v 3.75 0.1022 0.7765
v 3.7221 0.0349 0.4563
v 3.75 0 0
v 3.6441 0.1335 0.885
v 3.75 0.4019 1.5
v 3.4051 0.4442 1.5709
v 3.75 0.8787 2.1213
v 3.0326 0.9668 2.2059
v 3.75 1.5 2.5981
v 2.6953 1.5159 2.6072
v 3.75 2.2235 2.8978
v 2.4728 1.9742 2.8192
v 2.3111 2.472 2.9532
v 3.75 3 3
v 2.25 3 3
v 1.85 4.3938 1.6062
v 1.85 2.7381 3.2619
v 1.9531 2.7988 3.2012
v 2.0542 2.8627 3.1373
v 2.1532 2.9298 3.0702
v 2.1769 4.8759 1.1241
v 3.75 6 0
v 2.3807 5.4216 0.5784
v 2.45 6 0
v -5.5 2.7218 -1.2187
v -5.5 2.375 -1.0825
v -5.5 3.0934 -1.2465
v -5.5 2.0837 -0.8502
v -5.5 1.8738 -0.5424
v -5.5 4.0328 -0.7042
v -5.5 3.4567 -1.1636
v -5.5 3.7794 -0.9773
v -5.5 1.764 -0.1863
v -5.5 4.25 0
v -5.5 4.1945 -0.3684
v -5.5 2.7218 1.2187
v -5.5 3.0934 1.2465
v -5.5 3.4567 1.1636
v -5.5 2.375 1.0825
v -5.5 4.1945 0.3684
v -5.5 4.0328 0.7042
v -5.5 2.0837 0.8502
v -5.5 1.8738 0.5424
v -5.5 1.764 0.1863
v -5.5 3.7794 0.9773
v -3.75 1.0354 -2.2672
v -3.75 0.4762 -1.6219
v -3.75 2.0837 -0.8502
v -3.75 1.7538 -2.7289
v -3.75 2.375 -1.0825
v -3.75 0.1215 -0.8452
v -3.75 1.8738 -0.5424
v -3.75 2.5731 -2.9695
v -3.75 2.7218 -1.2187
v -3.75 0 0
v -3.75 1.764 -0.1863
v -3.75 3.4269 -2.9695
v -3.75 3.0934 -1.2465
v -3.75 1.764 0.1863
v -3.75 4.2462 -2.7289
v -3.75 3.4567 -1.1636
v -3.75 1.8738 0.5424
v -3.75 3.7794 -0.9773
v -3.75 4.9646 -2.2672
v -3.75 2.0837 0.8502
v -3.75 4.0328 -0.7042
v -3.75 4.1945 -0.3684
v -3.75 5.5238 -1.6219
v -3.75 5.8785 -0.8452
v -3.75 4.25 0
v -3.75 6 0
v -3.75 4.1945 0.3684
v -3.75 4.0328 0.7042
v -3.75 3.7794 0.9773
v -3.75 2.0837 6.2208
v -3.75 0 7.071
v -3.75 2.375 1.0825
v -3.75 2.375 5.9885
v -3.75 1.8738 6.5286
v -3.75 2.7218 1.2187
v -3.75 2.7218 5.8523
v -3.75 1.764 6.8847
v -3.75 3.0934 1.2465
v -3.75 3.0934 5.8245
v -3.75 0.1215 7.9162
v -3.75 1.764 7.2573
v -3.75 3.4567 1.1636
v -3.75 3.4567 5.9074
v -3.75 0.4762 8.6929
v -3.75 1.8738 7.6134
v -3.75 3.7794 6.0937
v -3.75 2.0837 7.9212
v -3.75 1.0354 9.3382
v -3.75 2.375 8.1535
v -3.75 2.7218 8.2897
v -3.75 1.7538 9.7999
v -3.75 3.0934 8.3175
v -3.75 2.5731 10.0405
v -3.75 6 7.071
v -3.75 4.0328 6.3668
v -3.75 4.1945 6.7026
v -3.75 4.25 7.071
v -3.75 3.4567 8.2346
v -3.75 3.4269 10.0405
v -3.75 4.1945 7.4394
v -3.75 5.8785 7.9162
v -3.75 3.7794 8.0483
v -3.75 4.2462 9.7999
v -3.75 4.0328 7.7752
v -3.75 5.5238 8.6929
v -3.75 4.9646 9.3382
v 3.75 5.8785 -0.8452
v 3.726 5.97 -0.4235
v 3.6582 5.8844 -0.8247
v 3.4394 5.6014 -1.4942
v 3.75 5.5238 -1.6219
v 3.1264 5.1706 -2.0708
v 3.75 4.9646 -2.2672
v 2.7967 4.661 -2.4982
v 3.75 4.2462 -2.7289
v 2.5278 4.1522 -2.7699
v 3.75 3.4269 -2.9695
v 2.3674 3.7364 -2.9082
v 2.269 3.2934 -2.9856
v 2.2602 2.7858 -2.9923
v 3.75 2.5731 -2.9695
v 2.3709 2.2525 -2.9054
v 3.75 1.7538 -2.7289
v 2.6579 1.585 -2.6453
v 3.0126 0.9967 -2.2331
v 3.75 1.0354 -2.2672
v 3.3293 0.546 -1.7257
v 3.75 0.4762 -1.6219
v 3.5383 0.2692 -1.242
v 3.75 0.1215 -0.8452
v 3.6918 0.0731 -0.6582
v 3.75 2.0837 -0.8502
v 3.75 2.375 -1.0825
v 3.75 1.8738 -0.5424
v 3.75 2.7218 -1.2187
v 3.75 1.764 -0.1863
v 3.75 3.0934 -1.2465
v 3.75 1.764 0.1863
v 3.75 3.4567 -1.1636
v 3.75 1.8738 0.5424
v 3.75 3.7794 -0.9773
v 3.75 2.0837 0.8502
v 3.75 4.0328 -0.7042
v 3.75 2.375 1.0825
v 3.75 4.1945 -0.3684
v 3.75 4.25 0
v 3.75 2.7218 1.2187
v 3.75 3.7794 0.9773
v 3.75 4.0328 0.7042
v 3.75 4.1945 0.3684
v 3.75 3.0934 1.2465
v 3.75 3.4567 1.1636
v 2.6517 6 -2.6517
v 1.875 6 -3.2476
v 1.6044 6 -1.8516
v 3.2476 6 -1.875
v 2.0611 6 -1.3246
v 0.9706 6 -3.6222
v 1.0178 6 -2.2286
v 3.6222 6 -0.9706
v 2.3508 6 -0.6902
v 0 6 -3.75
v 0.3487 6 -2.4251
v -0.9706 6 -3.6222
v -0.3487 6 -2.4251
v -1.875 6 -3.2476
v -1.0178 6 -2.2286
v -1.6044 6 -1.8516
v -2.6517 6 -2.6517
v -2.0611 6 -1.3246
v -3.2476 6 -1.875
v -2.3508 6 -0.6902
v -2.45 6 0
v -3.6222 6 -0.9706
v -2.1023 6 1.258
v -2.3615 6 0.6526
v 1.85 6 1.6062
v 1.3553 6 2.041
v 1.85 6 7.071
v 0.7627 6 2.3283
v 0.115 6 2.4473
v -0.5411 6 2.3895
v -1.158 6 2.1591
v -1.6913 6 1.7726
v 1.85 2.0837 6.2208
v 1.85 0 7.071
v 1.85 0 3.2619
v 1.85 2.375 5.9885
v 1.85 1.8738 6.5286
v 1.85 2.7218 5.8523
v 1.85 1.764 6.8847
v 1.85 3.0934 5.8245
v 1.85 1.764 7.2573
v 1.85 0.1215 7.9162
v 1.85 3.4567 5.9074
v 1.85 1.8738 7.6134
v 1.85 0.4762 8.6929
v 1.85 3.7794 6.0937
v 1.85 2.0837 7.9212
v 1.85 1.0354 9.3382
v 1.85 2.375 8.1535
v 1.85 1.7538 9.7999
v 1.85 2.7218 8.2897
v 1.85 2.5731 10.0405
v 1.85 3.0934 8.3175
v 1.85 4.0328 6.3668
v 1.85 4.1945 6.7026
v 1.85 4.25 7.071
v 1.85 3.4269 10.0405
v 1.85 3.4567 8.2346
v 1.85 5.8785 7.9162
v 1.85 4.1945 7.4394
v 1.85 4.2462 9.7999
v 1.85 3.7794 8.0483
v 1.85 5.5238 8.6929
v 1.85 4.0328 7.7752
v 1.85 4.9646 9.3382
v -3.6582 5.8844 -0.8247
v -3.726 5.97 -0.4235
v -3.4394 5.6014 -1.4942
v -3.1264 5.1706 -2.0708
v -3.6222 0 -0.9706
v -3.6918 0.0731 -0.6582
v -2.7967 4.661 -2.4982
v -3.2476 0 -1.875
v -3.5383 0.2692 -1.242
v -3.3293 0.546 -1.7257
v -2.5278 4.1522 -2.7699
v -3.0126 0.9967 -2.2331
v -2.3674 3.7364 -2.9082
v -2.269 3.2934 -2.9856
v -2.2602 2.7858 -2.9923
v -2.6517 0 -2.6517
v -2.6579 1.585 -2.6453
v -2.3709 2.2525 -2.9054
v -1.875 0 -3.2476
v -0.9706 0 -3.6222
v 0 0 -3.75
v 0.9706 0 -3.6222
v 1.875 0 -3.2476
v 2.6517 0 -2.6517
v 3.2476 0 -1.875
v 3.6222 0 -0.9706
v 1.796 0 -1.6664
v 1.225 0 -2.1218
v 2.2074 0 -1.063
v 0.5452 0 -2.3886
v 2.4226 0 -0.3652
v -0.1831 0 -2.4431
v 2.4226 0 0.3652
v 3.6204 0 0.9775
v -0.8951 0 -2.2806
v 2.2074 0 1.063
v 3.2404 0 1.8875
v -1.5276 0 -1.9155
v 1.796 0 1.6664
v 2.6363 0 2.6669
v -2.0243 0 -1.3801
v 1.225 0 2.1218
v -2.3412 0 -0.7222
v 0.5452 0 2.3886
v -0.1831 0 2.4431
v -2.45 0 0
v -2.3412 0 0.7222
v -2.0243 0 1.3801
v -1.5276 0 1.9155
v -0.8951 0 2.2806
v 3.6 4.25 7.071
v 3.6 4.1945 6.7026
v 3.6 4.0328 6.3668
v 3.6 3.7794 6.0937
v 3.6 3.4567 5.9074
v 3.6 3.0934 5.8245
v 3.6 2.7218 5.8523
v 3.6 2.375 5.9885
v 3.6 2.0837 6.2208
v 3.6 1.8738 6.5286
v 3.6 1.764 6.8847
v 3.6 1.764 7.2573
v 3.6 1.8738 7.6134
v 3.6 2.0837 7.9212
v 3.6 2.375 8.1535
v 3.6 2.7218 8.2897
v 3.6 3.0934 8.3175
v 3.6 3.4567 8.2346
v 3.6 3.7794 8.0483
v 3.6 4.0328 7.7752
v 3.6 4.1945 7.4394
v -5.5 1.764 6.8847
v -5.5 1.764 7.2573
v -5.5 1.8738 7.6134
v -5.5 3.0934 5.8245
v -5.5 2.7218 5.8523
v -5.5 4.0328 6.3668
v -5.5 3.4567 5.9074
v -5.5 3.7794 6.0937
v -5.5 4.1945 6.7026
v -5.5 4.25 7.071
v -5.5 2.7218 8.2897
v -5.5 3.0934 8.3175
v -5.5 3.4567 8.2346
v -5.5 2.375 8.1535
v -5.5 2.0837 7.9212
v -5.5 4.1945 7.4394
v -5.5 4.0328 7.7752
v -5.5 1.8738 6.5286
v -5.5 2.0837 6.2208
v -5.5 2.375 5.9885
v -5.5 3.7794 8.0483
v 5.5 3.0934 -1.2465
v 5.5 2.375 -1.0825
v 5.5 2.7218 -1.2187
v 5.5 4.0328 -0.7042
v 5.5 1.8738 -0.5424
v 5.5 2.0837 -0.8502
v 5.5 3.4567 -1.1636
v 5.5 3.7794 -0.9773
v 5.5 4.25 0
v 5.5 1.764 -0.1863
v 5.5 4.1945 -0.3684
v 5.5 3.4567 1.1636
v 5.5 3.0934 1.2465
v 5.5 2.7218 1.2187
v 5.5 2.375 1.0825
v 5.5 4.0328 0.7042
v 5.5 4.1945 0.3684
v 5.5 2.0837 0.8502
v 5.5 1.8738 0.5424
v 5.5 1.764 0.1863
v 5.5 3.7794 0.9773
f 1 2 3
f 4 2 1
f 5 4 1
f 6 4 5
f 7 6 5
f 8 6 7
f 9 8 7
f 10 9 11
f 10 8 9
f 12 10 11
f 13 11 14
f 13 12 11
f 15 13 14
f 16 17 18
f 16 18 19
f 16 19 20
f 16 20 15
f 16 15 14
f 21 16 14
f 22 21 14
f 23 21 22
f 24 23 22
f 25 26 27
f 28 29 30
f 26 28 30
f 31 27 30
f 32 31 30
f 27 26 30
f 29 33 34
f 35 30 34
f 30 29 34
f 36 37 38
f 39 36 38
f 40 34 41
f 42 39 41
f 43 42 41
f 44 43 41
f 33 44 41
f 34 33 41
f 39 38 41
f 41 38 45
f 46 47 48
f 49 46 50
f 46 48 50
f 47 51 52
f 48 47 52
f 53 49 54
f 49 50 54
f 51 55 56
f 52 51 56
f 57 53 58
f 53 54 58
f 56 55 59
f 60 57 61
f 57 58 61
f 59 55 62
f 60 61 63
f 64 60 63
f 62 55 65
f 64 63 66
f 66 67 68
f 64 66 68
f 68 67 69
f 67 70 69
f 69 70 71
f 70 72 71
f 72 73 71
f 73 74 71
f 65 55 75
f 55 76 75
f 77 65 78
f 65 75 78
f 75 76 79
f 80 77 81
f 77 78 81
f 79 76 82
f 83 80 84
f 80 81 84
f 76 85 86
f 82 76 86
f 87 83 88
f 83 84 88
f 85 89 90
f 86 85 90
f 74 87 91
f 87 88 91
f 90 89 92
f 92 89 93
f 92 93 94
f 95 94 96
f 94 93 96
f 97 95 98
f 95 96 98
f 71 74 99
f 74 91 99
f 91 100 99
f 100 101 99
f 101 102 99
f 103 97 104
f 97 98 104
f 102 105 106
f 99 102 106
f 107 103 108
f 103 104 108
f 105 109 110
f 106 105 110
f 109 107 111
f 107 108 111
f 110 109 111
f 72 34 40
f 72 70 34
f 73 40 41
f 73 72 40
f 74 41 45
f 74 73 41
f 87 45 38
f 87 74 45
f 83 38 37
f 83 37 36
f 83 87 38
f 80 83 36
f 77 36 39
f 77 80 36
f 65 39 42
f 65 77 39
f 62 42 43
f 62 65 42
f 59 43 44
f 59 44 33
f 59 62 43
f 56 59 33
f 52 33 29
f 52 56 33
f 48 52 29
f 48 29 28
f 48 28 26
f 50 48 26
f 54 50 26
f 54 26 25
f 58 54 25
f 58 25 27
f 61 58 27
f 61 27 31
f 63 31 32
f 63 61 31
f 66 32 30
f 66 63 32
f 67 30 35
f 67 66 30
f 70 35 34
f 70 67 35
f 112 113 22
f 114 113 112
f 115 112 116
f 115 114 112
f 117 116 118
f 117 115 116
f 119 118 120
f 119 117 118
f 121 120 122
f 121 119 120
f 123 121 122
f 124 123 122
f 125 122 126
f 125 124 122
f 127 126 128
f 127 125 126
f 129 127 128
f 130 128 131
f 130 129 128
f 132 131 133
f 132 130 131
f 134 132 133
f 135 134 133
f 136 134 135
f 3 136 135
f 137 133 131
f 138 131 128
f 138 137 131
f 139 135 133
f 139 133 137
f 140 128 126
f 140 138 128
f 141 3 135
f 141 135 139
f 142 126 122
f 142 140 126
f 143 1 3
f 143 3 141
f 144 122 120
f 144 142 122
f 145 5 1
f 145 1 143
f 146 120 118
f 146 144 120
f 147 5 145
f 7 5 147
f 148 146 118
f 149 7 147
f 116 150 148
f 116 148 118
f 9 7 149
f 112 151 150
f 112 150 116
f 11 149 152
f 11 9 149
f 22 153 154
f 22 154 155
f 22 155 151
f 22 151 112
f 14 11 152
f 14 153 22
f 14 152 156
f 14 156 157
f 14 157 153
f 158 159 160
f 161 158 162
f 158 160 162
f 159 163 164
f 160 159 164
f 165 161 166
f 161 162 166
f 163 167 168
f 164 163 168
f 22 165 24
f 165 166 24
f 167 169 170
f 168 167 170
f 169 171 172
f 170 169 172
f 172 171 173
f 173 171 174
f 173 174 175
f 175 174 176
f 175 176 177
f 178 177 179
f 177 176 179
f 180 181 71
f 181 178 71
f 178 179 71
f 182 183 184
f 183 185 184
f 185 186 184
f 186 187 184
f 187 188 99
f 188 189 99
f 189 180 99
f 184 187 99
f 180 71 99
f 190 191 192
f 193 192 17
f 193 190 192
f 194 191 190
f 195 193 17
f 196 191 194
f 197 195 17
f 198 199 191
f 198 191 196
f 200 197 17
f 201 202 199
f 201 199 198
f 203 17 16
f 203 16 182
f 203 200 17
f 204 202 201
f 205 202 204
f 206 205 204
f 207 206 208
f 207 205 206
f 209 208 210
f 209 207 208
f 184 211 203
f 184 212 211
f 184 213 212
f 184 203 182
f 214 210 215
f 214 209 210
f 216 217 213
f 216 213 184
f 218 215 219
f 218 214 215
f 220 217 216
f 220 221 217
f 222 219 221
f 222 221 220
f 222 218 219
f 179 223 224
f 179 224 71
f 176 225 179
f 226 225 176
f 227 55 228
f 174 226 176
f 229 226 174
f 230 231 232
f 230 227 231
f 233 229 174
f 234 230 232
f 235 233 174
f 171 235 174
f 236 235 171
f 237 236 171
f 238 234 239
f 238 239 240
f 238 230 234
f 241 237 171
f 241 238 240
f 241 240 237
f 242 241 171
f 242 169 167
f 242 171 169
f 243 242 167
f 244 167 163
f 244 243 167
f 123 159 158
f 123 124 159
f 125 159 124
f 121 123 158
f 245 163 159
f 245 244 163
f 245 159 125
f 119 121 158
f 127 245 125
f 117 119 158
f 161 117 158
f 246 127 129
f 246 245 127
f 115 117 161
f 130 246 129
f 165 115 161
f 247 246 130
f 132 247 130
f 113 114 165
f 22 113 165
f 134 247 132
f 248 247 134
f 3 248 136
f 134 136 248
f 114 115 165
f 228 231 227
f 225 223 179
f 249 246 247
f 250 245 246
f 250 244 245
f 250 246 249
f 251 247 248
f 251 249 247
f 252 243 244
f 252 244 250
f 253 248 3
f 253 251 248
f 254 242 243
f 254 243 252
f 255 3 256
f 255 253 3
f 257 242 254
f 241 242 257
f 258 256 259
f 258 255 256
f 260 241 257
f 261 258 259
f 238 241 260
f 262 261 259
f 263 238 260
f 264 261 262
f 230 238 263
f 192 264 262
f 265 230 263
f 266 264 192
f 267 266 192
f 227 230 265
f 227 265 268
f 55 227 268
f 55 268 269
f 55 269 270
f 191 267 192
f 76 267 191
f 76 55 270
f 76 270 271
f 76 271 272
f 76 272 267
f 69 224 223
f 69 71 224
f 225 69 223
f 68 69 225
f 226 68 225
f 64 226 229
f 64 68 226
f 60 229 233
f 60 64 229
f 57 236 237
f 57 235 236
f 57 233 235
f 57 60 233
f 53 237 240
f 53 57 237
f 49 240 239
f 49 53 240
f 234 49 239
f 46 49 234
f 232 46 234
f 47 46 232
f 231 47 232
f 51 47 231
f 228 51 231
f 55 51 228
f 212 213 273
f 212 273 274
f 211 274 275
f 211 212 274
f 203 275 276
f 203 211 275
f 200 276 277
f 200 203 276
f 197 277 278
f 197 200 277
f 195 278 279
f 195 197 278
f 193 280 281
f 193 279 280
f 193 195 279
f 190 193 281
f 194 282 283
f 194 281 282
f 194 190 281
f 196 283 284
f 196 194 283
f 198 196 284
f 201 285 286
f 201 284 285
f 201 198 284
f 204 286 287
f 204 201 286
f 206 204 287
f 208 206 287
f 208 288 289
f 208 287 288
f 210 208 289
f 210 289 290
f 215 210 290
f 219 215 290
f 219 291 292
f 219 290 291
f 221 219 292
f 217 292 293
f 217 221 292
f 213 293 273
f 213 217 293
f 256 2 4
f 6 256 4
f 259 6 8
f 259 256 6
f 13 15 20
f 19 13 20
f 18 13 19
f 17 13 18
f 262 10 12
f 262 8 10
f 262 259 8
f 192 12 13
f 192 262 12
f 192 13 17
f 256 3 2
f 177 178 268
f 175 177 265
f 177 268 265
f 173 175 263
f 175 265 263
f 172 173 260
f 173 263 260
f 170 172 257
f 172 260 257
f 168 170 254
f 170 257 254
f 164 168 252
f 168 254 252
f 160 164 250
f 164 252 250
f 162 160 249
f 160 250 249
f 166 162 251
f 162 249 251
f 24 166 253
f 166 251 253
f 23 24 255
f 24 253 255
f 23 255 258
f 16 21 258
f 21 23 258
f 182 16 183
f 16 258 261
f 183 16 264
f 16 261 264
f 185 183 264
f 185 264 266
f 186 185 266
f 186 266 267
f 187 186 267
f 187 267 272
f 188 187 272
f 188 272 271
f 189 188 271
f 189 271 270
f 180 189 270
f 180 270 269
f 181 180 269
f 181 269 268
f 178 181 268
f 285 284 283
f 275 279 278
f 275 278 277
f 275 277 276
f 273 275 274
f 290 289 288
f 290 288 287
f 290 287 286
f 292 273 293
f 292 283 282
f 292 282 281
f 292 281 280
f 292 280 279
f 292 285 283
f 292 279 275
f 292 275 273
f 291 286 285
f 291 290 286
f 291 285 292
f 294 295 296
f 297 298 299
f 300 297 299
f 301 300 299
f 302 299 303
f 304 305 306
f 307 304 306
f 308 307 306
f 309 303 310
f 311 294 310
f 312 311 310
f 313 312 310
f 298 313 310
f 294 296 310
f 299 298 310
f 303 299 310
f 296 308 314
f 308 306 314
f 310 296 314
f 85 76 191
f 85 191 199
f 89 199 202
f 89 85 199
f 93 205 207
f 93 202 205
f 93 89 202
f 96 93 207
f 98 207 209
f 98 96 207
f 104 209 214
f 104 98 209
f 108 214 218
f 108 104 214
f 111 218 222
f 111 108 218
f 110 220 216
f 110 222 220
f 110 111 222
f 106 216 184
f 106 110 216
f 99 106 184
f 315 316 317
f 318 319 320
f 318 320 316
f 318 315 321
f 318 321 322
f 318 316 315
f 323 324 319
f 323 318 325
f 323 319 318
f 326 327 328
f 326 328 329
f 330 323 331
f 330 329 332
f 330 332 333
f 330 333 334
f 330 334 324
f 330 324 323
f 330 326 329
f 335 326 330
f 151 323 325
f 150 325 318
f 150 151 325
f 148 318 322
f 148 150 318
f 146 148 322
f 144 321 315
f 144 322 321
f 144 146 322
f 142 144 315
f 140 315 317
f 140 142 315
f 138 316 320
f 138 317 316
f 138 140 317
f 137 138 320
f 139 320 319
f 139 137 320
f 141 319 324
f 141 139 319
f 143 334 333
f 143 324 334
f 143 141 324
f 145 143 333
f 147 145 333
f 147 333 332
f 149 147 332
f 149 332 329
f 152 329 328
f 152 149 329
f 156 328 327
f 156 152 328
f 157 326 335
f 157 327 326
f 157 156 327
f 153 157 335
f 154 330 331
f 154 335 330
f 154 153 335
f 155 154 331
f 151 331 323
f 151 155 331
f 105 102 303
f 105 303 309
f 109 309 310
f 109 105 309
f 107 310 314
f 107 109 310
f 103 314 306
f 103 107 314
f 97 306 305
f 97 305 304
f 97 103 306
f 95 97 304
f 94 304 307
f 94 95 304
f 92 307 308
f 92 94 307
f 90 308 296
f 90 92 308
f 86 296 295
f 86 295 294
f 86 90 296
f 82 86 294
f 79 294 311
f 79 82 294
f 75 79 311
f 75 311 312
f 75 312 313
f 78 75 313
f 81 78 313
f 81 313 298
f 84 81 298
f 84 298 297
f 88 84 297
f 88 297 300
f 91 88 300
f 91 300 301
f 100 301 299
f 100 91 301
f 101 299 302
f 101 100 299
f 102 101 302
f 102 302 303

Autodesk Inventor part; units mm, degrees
ref_plane "YZ Plane" through (0, 0, 0) normal (1, 0, 0) x (0, 1, 0)
ref_plane "XZ Plane" through (0, 0, 0) normal (0, 1, 0) x (-1, 0, 0)
ref_plane "XY Plane" through (0, 0, 0) normal (0, 0, 1) x (1, 0, 0)
sketch "Эскиз1" plane through (0, 0, 0) normal (0, 1, 0) x (-1, 0, 0)
  circle A0 centre (0, 0) radius 2.45
  circle A1 centre (0, 0) radius 3.75
  dimension "d0" = 4.9
  dimension "d1" = 7.5
extrude "Выдавливание1" add sketch "Эскиз1" along normal blind 6
sketch "Эскиз2" plane through (0, 0, 0) normal (1, 0, 0) x (0, 1, 0)
  circle A0 centre (3, 0) radius 1.25
  line L0 (0, -3.75) -> (0, 3.75) projected
  circle A1 centre (3, 0) radius 3
  circle A2 centre (3, 7.071) radius 1.25
  arc A3 (6, 7.071) -> (0, 7.071) centre (3, 7.071) ccw
  line L1 (3, 0) -> (3, 7.071) construction
  line L2 (6, 0) -> (6, 7.071)
  line L3 (0, 7.071) -> (0, 0)
  point P0 (0, 0)
  dimension "d7" = 6
  dimension "d4" = 2.5
  dimension "d12" = 2.5
  dimension "d13" = 6
  dimension "d14" = 7.071
extrude "Выдавливание3" add sketch "Эскиз2" along normal mid plane 7.5 contours A1
extrude "Выдавливание5" add sketch "Эскиз2" along normal blind 1.85 and the other way blind 3.75 contours L0 L3 A3 L2 A1
extrude "Выдавливание2" add sketch "Эскиз2" along normal mid plane 11 contours A0
extrude "Выдавливание4" cut sketch "Эскиз1" along normal blind 6 contours A0
extrude "Выдавливание7" add sketch "Эскиз2" along normal blind 3.6 and the other way blind 5.5 contours A2
sketch "Эскиз3" plane through (1.85, 0, 0) normal (1, 0, 0) x (0, 0, -1)
  circle A0 centre (-7.071, 3) radius 1.25 projected
  line L0 (-4.4382, 1.5618) -> (0, 6)
  line L1 (-3.2619, 6) -> (-7.071, 6) projected
  line L2 (0, 6) -> (-3.2619, 6) projected
  arc A1 (-7.071, 6) -> (-7.071, 0) centre (-7.071, 3) ccw projected
  arc A2 (-7.071, 0) -> (-7.071, 6) centre (-7.071, 3) ccw
  line L3 (3.75, 6) -> (0, 6) projected
  point P0 (0, 0)
  dimension "d26" = 45
extrude "Выдавливание8" cut sketch "Эскиз3" along normal blind 3.75 contours A2 L1 L2 L0
properties part number "Кулак левый"
